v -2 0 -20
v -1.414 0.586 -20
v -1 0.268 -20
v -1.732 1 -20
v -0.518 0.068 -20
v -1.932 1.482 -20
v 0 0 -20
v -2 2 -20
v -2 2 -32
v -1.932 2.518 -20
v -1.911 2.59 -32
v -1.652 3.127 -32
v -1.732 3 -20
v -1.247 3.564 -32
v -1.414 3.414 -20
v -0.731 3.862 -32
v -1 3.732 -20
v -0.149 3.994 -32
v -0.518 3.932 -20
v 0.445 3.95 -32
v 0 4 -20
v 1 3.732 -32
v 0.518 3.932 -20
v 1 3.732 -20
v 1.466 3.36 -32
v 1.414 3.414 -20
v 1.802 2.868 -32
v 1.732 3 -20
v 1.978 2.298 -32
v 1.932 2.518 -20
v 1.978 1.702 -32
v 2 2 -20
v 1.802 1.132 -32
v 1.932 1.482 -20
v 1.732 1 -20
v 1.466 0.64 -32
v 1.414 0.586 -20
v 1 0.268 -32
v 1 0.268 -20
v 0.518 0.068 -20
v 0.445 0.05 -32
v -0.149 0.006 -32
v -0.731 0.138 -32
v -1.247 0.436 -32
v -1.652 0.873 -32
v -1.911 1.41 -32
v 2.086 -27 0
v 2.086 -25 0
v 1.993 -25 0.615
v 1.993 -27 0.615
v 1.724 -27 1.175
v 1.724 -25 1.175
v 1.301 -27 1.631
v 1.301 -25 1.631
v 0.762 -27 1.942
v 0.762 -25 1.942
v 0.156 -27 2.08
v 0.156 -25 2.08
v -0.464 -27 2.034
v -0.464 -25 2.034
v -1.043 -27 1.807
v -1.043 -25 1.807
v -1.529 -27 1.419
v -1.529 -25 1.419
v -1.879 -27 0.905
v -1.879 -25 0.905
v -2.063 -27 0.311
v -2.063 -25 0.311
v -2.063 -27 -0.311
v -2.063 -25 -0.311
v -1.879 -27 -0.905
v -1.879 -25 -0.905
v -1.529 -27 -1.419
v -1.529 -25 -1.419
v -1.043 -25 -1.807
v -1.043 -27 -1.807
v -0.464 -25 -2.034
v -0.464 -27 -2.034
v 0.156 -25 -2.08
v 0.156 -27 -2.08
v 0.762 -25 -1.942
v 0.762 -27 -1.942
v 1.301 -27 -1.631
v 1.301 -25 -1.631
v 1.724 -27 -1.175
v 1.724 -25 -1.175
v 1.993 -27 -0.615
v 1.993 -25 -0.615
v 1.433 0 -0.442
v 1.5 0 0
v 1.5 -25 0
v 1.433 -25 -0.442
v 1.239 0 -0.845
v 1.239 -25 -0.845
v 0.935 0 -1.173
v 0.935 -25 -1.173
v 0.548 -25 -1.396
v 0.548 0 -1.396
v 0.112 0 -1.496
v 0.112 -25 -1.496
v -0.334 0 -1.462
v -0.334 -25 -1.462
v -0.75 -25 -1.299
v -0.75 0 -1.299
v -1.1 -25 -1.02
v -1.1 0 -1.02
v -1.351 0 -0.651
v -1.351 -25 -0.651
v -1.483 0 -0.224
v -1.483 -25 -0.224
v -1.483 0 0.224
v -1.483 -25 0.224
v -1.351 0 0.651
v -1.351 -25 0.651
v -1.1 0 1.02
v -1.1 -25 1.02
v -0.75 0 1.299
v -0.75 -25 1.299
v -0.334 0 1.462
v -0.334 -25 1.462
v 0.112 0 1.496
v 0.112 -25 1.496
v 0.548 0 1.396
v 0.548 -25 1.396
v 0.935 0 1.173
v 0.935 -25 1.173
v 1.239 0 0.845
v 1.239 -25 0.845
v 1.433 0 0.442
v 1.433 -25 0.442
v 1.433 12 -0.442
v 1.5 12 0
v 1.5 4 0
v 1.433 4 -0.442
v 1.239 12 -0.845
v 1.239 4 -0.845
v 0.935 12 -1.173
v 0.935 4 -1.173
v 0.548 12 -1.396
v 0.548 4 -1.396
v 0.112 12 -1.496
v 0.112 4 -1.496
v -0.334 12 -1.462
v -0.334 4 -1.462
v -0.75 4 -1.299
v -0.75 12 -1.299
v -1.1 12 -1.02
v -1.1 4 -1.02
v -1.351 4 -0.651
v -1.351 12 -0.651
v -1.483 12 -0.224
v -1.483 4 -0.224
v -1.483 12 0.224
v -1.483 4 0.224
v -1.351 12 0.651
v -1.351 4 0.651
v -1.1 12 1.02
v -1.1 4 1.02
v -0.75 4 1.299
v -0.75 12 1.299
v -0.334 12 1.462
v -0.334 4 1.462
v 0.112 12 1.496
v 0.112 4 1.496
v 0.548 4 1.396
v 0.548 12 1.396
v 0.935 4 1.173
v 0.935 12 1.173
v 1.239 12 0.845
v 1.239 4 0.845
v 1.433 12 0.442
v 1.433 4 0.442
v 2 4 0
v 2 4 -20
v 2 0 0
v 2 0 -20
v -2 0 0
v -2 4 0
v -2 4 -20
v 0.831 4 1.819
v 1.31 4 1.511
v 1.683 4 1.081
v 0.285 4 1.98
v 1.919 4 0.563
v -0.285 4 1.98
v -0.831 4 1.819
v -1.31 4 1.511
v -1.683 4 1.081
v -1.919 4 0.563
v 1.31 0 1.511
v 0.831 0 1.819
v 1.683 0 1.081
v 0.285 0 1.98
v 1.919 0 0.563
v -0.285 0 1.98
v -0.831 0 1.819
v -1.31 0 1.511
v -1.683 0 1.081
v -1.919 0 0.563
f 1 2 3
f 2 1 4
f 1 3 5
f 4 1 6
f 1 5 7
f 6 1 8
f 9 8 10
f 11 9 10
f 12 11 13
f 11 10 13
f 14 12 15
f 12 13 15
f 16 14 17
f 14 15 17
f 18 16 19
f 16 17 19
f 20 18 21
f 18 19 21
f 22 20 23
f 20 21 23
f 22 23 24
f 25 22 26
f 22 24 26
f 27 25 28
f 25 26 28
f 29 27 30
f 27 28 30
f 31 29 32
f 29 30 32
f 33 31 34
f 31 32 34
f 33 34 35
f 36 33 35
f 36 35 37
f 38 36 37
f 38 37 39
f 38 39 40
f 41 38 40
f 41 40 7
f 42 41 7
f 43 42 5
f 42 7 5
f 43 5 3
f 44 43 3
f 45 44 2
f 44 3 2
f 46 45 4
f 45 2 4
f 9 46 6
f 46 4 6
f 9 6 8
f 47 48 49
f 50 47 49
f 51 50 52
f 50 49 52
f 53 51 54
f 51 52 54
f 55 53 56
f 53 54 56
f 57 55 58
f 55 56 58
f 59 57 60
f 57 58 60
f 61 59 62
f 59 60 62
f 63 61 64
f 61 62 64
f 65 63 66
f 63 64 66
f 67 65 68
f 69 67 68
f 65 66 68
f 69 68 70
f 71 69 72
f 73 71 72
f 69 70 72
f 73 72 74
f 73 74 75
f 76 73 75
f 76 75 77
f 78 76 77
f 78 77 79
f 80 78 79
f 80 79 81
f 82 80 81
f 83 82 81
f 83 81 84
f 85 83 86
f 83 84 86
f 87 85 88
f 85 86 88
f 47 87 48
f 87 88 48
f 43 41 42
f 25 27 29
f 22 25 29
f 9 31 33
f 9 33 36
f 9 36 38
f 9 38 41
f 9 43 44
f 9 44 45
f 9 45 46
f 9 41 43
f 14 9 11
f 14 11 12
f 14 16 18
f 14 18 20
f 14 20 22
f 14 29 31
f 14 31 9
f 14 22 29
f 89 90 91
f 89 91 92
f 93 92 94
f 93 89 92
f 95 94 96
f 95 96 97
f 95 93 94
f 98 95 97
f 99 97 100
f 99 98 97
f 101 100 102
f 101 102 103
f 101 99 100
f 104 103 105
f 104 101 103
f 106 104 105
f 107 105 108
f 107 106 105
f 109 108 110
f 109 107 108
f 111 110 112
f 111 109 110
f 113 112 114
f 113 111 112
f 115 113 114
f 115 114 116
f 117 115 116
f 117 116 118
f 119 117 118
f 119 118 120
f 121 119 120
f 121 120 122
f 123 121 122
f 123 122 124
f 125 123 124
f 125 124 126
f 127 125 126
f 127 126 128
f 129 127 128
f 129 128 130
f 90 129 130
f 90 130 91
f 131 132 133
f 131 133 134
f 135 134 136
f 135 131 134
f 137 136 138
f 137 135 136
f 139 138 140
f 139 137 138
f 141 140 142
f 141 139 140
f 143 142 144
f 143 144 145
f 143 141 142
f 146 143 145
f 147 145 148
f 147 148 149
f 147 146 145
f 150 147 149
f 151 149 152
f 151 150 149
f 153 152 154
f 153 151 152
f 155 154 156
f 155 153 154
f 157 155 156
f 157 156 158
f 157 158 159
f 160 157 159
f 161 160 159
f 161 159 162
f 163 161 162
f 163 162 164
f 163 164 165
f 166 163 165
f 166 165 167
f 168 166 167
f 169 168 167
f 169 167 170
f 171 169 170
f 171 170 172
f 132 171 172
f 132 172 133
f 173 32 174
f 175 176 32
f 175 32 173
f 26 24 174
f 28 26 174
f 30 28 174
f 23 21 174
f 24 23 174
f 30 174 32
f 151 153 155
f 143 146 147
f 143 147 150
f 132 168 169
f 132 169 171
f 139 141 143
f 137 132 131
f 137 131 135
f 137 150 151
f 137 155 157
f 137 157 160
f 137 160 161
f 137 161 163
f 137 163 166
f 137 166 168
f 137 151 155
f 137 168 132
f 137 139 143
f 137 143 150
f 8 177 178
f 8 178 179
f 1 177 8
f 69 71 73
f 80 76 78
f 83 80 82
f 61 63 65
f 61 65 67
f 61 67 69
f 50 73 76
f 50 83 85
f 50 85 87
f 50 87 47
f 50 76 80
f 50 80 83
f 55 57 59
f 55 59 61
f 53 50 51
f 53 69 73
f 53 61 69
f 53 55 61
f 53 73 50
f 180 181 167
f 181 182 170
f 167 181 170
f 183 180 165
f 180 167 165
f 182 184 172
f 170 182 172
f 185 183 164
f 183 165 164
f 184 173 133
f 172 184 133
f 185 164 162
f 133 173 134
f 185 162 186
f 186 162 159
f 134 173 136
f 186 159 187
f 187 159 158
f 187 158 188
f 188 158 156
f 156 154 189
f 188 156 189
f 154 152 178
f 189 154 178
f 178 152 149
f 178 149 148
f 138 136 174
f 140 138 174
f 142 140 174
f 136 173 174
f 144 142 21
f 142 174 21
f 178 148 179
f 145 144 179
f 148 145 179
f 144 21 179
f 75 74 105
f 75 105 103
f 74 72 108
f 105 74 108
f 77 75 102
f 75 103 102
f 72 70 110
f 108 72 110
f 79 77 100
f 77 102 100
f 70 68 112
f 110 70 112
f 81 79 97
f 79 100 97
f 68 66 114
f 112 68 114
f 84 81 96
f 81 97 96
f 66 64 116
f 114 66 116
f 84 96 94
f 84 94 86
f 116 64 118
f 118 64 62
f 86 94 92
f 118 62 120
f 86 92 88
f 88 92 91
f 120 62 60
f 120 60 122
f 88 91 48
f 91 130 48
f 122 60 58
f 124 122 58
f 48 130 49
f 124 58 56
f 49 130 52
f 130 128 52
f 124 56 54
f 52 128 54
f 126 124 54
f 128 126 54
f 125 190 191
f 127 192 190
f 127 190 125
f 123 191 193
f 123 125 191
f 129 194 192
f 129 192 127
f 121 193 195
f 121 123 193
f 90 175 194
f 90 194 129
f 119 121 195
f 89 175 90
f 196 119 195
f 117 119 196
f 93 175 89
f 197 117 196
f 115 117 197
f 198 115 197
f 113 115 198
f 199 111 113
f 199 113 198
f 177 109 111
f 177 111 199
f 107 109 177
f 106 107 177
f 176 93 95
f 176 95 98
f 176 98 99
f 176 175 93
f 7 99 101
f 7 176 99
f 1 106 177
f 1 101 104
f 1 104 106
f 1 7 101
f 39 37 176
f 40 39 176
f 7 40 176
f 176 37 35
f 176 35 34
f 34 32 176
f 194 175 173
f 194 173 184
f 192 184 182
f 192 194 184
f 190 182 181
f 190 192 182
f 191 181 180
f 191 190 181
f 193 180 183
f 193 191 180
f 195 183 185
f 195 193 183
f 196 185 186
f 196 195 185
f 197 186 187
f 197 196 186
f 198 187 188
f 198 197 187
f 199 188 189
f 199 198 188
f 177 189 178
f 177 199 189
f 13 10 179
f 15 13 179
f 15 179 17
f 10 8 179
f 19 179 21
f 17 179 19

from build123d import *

# Parameters (mm, degrees)
BOSS_EXTRUDE1_DEPTH = 4
SKETCH2_R           = 1.5
BOSS_EXTRUDE2_DEPTH = 37
SKETCH3_R           = 2.086060033
BOSS_EXTRUDE3_DEPTH = 2
SKETCH4_W           = 5
SKETCH4_H           = 3.576334768
CUT_EXTRUDE1_DEPTH  = 32
SKETCH5_R           = 2
BOSS_EXTRUDE4_DEPTH = 12


with BuildPart() as part:
    # Sketch1 → Boss-Extrude1 (new body)
    with BuildSketch(Plane(origin=(0, 0, 0), x_dir=(1, 0, 0), z_dir=(0, 1, 0))):
        with BuildLine():
            Line((-2, 0), (-2, 20))
            ThreePointArc((-2, 20), (0, 22), (2, 20))
            Line((2, 20), (2, 0))
            ThreePointArc((2, 0), (0, -2), (-2, 0))
        make_face()
    extrude(amount=BOSS_EXTRUDE1_DEPTH)

    # Sketch2 → Boss-Extrude2 (add)
    with BuildSketch(Plane(origin=(0, 12, 0), x_dir=(1, 0, 0), z_dir=(0, 1, 0))):
        Circle(SKETCH2_R)
    extrude(amount=-BOSS_EXTRUDE2_DEPTH)

    # Sketch3 → Boss-Extrude3 (add)
    with BuildSketch(Plane.XZ.offset(25)):
        Circle(SKETCH3_R)
    extrude(amount=BOSS_EXTRUDE3_DEPTH)

    # Sketch4 → Cut-Extrude1 (cut, through all)
    with BuildSketch(Plane(origin=(0, 4, 0), x_dir=(1, 0, 0), z_dir=(0, 1, 0))):
        with Locations((0.5, 21.788167384)):
            Rectangle(SKETCH4_W, SKETCH4_H)
    extrude(amount=-CUT_EXTRUDE1_DEPTH, mode=Mode.SUBTRACT)

    # Sketch5 → Boss-Extrude4 (add)
    with BuildSketch(Plane(origin=(0, 0, -20), x_dir=(-1, 0, 0), z_dir=(0, 0, -1))):
        with Locations((0, 2)):
            Circle(SKETCH5_R)
    extrude(amount=BOSS_EXTRUDE4_DEPTH)


solid = part.part
